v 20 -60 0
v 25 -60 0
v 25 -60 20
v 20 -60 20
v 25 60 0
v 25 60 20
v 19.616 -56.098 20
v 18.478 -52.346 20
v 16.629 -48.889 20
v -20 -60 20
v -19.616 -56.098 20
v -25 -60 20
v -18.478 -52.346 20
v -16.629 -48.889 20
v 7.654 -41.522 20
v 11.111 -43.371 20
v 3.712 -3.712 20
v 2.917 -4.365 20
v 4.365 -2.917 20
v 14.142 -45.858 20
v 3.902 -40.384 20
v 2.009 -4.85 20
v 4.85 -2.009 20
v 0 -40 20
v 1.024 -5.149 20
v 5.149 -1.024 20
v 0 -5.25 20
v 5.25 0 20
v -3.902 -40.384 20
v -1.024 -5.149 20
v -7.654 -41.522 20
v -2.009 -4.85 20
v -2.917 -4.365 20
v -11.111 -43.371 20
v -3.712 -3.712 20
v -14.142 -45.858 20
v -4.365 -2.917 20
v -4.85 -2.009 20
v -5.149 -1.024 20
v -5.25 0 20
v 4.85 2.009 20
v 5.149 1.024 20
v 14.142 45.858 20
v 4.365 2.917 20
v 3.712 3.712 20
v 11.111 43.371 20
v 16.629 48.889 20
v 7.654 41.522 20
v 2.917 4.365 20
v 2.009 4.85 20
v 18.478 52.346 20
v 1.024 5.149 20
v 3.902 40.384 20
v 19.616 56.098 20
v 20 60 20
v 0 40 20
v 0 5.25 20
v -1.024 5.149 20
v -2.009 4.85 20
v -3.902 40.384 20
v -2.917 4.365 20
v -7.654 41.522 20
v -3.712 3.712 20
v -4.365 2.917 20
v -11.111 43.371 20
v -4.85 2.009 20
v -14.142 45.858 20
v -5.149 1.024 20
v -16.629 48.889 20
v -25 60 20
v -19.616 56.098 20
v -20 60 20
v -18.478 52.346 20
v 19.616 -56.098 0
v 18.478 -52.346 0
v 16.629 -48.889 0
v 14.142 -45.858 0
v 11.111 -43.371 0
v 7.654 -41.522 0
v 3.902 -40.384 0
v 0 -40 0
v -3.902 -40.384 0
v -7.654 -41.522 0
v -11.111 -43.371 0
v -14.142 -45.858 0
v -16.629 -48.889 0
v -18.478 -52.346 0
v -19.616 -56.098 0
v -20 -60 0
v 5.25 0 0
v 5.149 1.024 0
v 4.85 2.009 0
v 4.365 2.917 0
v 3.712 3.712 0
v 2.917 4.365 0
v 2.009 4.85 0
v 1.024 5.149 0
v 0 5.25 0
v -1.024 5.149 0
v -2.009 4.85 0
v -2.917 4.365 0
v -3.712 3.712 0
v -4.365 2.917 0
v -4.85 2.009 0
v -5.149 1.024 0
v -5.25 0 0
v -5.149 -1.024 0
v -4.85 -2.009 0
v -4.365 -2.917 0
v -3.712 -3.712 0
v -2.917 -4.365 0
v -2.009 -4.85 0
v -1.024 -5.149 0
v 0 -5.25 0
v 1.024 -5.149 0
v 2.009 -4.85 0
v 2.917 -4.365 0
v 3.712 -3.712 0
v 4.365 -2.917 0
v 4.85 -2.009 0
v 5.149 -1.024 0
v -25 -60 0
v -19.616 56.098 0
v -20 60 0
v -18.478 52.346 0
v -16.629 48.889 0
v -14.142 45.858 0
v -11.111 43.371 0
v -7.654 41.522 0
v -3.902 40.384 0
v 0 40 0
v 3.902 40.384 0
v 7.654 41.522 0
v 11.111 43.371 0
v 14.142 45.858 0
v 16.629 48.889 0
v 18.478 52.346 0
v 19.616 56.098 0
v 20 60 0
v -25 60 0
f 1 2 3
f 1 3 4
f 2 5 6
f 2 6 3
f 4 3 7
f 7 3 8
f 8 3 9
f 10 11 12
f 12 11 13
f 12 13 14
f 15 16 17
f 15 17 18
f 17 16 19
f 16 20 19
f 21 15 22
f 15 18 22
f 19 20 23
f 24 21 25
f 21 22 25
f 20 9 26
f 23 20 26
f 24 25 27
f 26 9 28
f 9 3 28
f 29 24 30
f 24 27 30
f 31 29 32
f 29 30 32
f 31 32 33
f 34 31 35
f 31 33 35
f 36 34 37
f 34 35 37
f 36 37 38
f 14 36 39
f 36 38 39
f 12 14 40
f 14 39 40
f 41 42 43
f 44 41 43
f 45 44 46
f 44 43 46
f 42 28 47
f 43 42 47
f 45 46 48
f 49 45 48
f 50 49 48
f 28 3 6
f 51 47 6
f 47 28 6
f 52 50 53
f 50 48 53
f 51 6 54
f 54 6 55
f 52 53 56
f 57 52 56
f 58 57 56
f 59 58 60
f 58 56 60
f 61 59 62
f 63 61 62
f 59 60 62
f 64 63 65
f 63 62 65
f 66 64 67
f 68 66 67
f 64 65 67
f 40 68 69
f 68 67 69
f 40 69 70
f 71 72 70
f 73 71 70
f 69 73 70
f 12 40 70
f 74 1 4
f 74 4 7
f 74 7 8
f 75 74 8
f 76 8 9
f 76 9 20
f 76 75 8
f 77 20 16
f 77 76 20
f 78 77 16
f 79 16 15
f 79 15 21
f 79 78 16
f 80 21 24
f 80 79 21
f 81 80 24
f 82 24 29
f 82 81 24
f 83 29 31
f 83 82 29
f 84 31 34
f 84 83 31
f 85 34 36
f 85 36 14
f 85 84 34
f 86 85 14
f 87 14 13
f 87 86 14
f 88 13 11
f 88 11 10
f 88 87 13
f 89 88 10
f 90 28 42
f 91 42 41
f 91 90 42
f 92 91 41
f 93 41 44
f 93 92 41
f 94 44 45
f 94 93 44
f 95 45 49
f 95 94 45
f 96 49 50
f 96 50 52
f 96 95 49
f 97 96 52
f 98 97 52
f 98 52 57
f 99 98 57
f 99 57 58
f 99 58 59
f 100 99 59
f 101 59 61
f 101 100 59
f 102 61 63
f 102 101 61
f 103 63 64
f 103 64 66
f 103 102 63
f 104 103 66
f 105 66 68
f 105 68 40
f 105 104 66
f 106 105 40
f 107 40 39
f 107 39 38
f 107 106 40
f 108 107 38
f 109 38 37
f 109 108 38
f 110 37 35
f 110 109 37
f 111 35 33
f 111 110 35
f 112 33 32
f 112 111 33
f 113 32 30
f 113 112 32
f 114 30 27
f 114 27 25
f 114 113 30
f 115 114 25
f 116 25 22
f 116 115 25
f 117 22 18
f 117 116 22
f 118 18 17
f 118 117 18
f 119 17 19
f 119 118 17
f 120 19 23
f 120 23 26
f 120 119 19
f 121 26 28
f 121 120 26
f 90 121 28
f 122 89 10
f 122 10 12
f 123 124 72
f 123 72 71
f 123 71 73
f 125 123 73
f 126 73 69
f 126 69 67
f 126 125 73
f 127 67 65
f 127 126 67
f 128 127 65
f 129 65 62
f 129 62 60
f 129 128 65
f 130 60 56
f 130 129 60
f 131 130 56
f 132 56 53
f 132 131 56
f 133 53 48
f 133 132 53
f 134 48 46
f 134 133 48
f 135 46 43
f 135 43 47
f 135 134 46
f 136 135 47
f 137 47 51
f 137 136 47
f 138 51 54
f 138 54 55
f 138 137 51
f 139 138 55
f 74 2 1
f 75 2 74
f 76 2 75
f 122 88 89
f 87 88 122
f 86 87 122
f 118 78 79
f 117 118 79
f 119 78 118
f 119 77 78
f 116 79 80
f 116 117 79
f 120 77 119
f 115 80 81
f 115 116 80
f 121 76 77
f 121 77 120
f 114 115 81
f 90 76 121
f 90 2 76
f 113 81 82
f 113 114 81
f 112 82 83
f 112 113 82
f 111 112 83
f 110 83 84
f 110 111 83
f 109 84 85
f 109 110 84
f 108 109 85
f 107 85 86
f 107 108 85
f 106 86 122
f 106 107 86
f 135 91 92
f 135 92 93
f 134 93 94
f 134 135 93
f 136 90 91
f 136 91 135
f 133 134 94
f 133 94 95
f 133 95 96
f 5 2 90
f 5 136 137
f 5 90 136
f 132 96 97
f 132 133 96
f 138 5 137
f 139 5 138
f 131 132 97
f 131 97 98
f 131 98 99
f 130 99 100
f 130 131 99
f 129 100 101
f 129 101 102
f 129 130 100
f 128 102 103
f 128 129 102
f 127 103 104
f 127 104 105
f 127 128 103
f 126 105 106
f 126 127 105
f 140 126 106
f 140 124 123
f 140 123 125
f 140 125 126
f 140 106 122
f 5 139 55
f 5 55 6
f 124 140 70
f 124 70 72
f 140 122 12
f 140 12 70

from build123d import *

# Parameters (mm, degrees)
SKETCH1_R           = 5.25
BOSS_EXTRUDE1_DEPTH = 20


with BuildPart() as part:
    # Sketch1 → Boss-Extrude1 (new body)
    with BuildSketch(Plane.XY):
        with BuildLine():
            Line((20, 60), (25, 60))
            Line((25, 60), (25, -60))
            Line((25, -60), (20, -60))
            ThreePointArc((20, -60), (0, -40), (-20, -60))
            Line((-20, -60), (-25, -60))
            Line((-25, -60), (-25, 60))
            Line((-25, 60), (-20, 60))
            ThreePointArc((-20, 60), (0, 40), (20, 60))
        make_face()
        Circle(SKETCH1_R, mode=Mode.SUBTRACT)
    extrude(amount=BOSS_EXTRUDE1_DEPTH)


solid = part.part
